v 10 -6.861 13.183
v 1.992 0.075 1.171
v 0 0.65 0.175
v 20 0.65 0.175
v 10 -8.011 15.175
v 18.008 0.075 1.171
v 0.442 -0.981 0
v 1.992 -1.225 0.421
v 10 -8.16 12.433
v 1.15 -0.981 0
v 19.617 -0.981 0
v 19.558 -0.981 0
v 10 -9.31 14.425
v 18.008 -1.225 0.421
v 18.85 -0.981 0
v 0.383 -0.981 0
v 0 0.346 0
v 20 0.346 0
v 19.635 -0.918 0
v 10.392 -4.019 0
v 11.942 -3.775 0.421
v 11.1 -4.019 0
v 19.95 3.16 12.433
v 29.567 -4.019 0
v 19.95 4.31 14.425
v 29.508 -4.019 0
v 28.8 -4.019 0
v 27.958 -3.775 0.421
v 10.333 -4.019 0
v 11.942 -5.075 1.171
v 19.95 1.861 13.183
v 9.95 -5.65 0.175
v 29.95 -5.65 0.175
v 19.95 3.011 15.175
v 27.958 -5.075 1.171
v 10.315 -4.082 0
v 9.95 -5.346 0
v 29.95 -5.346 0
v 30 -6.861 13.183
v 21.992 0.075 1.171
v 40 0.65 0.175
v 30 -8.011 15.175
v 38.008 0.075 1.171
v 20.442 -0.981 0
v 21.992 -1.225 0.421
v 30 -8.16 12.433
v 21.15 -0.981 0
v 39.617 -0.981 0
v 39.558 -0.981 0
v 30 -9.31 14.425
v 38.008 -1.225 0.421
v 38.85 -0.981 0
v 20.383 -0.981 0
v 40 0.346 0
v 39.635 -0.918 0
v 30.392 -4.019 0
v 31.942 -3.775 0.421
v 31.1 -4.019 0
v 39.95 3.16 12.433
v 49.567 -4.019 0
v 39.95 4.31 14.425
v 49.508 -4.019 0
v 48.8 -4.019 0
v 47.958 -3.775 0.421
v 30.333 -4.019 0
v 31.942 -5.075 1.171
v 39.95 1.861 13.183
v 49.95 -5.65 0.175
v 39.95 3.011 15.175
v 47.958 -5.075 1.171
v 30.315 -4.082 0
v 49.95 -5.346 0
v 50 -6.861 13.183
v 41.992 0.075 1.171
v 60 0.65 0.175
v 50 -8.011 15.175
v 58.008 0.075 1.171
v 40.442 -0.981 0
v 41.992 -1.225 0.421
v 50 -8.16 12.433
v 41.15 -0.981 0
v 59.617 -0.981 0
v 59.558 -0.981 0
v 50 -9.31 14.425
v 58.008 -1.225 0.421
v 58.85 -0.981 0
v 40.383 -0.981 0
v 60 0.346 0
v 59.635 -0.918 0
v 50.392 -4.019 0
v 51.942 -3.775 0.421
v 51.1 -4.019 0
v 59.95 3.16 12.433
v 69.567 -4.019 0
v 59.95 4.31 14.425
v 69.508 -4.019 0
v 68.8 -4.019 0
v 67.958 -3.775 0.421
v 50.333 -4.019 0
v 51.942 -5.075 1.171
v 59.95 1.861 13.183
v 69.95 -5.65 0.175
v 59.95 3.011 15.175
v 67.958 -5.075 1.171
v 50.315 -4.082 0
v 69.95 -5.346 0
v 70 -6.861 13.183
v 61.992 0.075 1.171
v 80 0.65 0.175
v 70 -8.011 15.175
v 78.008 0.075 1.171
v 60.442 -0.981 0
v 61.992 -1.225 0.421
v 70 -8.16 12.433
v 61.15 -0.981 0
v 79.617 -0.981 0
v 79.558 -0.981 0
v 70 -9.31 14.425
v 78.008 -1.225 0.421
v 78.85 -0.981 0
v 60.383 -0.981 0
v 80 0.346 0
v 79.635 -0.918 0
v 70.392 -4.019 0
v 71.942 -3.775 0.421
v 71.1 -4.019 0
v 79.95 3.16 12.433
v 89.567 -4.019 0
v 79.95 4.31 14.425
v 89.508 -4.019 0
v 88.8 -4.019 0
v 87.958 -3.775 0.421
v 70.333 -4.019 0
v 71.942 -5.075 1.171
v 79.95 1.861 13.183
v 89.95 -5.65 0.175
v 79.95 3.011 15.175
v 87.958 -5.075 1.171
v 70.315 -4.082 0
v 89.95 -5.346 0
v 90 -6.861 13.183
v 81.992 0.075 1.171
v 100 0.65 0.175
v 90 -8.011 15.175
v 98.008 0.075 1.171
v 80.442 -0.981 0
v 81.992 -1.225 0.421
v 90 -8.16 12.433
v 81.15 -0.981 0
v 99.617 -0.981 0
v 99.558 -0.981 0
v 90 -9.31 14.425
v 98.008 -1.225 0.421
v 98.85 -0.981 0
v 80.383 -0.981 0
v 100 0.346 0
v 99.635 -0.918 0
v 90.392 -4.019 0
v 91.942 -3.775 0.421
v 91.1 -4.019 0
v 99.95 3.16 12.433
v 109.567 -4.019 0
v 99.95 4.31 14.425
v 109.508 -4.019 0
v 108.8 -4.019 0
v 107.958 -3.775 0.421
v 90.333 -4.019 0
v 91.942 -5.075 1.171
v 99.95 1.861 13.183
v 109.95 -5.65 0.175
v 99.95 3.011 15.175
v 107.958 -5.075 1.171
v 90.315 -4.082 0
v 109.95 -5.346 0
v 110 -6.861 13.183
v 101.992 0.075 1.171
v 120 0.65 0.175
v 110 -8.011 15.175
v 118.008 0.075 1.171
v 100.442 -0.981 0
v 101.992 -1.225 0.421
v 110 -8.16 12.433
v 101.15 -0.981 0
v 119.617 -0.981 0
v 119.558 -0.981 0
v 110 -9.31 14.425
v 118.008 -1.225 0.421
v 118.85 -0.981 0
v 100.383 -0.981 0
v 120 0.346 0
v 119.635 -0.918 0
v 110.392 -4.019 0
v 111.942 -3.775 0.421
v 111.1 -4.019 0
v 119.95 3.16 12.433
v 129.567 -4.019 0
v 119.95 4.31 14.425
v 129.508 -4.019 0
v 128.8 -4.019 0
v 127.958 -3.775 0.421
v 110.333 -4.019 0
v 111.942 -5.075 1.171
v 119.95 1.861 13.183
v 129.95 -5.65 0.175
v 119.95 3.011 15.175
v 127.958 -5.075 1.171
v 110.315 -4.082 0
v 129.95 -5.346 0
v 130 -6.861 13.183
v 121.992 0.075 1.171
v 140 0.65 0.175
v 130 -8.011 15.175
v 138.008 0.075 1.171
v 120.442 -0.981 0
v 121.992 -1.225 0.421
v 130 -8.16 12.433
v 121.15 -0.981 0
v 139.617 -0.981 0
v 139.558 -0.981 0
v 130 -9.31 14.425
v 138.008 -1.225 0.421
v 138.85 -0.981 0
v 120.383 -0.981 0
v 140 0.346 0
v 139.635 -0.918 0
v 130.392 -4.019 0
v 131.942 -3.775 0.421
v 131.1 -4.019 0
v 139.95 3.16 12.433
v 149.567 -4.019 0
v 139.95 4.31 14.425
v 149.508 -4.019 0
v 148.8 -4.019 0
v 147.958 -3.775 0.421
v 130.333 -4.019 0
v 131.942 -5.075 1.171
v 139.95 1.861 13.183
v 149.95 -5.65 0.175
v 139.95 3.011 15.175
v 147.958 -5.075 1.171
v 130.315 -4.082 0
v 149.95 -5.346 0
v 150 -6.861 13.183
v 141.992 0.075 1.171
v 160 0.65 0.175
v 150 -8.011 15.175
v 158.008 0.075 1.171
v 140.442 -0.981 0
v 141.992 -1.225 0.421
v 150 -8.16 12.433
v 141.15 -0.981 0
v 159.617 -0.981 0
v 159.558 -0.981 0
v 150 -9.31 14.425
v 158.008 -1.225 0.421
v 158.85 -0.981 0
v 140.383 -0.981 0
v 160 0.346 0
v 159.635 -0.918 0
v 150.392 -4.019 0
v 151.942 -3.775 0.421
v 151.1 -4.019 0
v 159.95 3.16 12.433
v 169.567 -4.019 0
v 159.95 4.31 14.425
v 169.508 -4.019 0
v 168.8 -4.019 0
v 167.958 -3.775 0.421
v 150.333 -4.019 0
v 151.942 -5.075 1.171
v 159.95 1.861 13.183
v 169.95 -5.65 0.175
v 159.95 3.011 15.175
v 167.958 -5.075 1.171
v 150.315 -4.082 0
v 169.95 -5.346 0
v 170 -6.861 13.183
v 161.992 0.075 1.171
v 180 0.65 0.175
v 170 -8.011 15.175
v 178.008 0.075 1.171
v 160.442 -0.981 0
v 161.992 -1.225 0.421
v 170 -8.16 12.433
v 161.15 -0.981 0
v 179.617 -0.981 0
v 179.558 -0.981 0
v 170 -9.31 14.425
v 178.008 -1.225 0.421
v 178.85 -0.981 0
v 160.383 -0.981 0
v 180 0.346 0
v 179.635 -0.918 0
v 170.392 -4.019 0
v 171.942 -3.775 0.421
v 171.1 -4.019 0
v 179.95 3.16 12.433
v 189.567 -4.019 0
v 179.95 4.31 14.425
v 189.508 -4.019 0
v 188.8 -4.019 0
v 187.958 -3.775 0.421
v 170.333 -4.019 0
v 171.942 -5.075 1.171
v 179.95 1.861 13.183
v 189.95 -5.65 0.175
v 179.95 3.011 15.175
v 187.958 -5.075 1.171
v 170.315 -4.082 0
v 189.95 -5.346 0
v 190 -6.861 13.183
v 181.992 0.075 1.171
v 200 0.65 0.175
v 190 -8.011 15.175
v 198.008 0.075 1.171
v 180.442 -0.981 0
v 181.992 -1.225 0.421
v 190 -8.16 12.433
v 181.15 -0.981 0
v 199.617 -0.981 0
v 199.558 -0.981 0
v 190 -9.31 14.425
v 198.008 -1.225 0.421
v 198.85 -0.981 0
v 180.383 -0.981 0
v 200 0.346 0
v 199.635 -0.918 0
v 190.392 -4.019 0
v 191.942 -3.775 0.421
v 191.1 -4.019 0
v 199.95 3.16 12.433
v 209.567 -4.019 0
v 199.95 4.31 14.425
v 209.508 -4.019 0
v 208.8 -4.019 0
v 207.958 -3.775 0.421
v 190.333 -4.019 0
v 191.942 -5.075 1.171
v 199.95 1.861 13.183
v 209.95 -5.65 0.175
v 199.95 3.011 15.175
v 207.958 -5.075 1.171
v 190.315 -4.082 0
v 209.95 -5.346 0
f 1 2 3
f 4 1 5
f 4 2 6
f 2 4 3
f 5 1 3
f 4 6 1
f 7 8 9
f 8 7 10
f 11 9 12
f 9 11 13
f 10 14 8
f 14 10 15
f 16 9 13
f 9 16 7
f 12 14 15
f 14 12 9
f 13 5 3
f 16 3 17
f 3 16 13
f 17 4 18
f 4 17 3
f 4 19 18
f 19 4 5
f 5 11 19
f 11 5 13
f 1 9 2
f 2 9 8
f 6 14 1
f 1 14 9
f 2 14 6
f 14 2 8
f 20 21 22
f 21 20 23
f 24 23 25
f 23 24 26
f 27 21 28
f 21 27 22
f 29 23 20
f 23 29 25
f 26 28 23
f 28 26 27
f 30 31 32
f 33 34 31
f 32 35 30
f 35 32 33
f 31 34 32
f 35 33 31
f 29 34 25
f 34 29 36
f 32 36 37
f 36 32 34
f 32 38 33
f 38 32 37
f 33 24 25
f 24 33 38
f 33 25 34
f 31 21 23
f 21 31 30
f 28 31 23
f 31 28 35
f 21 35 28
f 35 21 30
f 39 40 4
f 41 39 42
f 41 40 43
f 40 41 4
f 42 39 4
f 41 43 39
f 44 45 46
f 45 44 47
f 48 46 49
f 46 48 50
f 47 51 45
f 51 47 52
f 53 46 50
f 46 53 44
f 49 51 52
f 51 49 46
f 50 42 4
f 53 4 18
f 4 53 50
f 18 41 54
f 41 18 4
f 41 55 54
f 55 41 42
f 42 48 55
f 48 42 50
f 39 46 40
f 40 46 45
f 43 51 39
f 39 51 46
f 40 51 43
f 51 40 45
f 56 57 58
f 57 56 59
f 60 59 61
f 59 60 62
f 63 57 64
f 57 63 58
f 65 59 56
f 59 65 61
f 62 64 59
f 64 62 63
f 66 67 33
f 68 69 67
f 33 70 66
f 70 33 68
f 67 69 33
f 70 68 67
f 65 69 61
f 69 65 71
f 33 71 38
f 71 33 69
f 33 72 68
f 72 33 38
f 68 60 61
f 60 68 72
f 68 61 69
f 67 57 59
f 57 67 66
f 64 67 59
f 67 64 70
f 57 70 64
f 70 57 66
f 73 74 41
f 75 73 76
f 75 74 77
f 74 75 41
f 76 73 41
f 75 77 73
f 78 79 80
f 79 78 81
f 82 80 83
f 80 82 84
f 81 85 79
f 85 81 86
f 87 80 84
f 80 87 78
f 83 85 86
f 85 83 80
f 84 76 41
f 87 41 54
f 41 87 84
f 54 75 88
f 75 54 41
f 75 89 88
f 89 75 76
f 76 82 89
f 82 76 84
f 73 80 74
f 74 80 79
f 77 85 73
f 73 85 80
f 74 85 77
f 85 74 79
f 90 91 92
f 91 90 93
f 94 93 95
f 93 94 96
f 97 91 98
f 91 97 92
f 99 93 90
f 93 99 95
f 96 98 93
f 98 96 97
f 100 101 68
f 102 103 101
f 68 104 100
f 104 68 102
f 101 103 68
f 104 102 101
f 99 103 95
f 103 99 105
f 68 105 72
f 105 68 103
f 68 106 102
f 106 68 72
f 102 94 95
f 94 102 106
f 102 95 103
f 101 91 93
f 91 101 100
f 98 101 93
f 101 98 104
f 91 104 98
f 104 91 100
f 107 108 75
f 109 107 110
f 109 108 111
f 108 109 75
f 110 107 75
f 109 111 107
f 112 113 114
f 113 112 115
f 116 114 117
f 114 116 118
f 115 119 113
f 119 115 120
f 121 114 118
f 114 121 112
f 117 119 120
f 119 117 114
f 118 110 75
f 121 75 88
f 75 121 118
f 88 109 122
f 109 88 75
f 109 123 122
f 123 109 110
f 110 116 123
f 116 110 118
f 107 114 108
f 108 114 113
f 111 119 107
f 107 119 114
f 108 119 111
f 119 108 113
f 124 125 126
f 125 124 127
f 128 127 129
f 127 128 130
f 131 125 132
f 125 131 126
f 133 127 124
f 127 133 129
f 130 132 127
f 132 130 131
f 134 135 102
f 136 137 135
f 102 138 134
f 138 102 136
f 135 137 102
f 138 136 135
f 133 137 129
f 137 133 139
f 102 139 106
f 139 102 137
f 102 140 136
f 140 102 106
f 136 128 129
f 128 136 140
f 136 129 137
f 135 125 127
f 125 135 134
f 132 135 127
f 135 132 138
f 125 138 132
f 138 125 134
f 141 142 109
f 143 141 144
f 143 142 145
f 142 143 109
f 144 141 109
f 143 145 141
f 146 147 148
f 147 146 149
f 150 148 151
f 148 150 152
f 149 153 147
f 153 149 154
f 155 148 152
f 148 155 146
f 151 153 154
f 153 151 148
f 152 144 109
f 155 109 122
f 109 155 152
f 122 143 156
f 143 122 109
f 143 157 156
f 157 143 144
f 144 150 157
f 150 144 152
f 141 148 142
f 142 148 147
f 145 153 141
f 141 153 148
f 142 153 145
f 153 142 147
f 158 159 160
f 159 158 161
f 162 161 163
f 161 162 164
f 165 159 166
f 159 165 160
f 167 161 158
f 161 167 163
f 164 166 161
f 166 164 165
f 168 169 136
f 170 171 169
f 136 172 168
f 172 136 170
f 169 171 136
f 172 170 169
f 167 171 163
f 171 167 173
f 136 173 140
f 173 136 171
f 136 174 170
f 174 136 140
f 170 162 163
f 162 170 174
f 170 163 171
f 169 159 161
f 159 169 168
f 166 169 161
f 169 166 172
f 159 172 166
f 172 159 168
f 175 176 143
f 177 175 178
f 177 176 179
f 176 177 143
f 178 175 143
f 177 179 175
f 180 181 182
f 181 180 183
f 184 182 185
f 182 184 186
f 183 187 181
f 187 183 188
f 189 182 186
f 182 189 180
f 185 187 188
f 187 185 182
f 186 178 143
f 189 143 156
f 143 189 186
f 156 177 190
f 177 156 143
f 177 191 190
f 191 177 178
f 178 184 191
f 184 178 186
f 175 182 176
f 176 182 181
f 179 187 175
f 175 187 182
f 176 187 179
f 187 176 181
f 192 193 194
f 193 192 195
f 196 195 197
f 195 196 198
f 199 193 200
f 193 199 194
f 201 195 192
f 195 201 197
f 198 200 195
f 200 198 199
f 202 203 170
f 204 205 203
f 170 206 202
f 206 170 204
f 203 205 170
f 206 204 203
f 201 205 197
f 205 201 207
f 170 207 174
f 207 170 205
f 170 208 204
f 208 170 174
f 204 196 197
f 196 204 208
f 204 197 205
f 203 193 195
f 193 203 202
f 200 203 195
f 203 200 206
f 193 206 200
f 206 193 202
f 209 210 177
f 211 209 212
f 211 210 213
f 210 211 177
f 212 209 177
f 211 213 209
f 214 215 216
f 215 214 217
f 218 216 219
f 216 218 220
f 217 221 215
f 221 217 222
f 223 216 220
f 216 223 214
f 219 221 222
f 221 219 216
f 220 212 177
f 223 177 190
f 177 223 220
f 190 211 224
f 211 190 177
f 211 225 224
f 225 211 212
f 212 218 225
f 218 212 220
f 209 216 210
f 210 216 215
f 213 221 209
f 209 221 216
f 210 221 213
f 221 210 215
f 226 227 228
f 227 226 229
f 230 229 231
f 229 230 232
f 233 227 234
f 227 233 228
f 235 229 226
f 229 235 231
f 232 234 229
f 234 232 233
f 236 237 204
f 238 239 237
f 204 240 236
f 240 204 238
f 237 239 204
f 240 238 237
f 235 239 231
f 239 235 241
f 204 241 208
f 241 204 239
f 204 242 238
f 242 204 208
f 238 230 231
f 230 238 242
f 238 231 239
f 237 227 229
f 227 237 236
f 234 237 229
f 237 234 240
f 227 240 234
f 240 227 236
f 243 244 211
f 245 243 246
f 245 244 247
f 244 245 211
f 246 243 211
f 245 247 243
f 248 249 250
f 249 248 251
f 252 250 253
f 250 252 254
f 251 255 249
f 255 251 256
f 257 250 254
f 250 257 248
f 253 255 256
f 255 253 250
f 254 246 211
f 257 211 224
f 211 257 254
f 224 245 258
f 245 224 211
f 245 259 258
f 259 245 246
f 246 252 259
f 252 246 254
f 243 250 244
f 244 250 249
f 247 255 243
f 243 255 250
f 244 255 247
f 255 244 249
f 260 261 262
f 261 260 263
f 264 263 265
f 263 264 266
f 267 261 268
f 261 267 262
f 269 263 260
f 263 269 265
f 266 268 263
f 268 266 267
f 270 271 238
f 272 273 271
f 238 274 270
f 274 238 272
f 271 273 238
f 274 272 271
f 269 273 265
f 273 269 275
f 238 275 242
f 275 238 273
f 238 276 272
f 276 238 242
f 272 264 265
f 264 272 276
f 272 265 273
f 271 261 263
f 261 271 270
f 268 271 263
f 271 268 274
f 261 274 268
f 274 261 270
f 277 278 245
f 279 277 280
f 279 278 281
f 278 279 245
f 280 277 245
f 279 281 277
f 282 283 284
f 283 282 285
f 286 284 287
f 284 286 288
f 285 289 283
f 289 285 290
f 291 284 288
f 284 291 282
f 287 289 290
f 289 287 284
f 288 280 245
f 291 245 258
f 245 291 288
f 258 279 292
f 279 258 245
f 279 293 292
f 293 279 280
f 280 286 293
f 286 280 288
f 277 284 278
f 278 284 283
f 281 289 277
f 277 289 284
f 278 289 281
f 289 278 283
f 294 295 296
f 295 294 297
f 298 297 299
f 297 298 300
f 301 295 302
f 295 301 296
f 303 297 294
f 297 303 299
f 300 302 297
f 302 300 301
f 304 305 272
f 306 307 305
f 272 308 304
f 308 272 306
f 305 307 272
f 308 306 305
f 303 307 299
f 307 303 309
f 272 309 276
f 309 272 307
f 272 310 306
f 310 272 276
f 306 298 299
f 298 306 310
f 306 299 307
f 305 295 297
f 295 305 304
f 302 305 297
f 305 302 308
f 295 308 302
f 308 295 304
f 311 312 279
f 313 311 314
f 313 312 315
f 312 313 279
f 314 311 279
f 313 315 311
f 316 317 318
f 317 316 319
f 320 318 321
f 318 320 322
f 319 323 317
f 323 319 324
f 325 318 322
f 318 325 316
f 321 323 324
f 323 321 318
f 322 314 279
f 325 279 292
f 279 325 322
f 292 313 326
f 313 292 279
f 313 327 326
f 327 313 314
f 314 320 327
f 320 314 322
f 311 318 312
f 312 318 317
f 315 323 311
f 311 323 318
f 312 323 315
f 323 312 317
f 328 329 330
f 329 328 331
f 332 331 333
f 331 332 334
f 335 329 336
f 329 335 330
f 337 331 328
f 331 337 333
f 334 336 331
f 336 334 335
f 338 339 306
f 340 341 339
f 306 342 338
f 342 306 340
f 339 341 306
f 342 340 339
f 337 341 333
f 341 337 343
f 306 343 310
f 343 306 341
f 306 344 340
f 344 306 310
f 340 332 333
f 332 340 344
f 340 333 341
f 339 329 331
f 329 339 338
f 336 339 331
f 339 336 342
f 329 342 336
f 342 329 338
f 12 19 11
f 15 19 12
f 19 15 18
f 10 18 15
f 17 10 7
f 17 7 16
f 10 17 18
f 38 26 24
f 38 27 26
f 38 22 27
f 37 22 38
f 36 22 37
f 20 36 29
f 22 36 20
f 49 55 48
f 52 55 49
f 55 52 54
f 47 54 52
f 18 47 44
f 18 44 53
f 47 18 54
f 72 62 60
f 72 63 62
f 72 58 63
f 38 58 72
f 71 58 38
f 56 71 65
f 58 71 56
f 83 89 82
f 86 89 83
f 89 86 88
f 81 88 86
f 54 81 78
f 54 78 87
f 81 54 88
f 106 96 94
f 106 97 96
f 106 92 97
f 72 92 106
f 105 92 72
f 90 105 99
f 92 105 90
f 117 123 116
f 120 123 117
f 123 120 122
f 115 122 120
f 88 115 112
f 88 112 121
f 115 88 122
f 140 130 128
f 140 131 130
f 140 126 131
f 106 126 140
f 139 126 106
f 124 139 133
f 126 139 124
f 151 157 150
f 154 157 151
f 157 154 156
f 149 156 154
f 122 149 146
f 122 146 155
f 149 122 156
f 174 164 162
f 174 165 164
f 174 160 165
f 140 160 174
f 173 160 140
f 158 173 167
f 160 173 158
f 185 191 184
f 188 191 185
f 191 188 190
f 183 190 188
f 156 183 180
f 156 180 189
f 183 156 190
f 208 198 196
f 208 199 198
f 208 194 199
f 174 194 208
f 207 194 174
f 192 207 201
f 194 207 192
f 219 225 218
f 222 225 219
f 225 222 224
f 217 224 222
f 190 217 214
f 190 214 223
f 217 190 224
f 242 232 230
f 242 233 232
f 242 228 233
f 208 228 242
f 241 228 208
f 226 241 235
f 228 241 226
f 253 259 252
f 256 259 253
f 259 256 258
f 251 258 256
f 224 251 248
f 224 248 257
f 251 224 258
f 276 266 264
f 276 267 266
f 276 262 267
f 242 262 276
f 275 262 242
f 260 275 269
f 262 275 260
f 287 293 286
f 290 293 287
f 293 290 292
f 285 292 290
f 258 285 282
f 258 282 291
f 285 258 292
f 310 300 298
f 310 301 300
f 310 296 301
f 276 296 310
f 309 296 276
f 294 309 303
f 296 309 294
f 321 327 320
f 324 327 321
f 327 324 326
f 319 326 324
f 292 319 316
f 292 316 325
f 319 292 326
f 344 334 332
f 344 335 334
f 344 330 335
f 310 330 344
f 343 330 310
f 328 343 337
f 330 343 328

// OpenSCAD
thickness = 2.3;
totalTriangleWidth=20;

module flatBase() {
    translate ( v = [-50, -50, -0.5]) { 
        linear_extrude(height = 1, center = true, convexity = 10, twist = 0) {

            square(1000,0);
        }
    }

}

module triangle() {    
    linear_extrude(height = 1.5, center = true, convexity = 10, twist = 0) {
    difference() {
        totalHeight=totalTriangleWidth*sqrt(3)/2;
        
        polygon(points=[[0,0],[totalTriangleWidth/2,totalHeight],[totalTriangleWidth,0]]);
        
        polygon(points=[
            [sin(60) *thickness,cos(60) * thickness],
            [totalTriangleWidth/2, totalHeight-thickness],
            [totalTriangleWidth - sin(60) *thickness,cos(60) * thickness]
        ]);
    }  
  }
}


module joinedTriangles() {
    translate( v = [0 , 0, -0.2]) {
         rotate(a=[120,0,0])
         {
            
            triangle();
            
        }
    }

    translate ( v = [9.95,-5, -0.2]) { 
        rotate(a=[60,0,0])
         {
            
            triangle();
         }
            
        
    }

}
difference() {
    spacing = totalTriangleWidth;

     for (a =[0:spacing:spacing*9]) {
        translate(v =[a,0,0]) {
            joinedTriangles();
        }
     }
    flatBase();
}
